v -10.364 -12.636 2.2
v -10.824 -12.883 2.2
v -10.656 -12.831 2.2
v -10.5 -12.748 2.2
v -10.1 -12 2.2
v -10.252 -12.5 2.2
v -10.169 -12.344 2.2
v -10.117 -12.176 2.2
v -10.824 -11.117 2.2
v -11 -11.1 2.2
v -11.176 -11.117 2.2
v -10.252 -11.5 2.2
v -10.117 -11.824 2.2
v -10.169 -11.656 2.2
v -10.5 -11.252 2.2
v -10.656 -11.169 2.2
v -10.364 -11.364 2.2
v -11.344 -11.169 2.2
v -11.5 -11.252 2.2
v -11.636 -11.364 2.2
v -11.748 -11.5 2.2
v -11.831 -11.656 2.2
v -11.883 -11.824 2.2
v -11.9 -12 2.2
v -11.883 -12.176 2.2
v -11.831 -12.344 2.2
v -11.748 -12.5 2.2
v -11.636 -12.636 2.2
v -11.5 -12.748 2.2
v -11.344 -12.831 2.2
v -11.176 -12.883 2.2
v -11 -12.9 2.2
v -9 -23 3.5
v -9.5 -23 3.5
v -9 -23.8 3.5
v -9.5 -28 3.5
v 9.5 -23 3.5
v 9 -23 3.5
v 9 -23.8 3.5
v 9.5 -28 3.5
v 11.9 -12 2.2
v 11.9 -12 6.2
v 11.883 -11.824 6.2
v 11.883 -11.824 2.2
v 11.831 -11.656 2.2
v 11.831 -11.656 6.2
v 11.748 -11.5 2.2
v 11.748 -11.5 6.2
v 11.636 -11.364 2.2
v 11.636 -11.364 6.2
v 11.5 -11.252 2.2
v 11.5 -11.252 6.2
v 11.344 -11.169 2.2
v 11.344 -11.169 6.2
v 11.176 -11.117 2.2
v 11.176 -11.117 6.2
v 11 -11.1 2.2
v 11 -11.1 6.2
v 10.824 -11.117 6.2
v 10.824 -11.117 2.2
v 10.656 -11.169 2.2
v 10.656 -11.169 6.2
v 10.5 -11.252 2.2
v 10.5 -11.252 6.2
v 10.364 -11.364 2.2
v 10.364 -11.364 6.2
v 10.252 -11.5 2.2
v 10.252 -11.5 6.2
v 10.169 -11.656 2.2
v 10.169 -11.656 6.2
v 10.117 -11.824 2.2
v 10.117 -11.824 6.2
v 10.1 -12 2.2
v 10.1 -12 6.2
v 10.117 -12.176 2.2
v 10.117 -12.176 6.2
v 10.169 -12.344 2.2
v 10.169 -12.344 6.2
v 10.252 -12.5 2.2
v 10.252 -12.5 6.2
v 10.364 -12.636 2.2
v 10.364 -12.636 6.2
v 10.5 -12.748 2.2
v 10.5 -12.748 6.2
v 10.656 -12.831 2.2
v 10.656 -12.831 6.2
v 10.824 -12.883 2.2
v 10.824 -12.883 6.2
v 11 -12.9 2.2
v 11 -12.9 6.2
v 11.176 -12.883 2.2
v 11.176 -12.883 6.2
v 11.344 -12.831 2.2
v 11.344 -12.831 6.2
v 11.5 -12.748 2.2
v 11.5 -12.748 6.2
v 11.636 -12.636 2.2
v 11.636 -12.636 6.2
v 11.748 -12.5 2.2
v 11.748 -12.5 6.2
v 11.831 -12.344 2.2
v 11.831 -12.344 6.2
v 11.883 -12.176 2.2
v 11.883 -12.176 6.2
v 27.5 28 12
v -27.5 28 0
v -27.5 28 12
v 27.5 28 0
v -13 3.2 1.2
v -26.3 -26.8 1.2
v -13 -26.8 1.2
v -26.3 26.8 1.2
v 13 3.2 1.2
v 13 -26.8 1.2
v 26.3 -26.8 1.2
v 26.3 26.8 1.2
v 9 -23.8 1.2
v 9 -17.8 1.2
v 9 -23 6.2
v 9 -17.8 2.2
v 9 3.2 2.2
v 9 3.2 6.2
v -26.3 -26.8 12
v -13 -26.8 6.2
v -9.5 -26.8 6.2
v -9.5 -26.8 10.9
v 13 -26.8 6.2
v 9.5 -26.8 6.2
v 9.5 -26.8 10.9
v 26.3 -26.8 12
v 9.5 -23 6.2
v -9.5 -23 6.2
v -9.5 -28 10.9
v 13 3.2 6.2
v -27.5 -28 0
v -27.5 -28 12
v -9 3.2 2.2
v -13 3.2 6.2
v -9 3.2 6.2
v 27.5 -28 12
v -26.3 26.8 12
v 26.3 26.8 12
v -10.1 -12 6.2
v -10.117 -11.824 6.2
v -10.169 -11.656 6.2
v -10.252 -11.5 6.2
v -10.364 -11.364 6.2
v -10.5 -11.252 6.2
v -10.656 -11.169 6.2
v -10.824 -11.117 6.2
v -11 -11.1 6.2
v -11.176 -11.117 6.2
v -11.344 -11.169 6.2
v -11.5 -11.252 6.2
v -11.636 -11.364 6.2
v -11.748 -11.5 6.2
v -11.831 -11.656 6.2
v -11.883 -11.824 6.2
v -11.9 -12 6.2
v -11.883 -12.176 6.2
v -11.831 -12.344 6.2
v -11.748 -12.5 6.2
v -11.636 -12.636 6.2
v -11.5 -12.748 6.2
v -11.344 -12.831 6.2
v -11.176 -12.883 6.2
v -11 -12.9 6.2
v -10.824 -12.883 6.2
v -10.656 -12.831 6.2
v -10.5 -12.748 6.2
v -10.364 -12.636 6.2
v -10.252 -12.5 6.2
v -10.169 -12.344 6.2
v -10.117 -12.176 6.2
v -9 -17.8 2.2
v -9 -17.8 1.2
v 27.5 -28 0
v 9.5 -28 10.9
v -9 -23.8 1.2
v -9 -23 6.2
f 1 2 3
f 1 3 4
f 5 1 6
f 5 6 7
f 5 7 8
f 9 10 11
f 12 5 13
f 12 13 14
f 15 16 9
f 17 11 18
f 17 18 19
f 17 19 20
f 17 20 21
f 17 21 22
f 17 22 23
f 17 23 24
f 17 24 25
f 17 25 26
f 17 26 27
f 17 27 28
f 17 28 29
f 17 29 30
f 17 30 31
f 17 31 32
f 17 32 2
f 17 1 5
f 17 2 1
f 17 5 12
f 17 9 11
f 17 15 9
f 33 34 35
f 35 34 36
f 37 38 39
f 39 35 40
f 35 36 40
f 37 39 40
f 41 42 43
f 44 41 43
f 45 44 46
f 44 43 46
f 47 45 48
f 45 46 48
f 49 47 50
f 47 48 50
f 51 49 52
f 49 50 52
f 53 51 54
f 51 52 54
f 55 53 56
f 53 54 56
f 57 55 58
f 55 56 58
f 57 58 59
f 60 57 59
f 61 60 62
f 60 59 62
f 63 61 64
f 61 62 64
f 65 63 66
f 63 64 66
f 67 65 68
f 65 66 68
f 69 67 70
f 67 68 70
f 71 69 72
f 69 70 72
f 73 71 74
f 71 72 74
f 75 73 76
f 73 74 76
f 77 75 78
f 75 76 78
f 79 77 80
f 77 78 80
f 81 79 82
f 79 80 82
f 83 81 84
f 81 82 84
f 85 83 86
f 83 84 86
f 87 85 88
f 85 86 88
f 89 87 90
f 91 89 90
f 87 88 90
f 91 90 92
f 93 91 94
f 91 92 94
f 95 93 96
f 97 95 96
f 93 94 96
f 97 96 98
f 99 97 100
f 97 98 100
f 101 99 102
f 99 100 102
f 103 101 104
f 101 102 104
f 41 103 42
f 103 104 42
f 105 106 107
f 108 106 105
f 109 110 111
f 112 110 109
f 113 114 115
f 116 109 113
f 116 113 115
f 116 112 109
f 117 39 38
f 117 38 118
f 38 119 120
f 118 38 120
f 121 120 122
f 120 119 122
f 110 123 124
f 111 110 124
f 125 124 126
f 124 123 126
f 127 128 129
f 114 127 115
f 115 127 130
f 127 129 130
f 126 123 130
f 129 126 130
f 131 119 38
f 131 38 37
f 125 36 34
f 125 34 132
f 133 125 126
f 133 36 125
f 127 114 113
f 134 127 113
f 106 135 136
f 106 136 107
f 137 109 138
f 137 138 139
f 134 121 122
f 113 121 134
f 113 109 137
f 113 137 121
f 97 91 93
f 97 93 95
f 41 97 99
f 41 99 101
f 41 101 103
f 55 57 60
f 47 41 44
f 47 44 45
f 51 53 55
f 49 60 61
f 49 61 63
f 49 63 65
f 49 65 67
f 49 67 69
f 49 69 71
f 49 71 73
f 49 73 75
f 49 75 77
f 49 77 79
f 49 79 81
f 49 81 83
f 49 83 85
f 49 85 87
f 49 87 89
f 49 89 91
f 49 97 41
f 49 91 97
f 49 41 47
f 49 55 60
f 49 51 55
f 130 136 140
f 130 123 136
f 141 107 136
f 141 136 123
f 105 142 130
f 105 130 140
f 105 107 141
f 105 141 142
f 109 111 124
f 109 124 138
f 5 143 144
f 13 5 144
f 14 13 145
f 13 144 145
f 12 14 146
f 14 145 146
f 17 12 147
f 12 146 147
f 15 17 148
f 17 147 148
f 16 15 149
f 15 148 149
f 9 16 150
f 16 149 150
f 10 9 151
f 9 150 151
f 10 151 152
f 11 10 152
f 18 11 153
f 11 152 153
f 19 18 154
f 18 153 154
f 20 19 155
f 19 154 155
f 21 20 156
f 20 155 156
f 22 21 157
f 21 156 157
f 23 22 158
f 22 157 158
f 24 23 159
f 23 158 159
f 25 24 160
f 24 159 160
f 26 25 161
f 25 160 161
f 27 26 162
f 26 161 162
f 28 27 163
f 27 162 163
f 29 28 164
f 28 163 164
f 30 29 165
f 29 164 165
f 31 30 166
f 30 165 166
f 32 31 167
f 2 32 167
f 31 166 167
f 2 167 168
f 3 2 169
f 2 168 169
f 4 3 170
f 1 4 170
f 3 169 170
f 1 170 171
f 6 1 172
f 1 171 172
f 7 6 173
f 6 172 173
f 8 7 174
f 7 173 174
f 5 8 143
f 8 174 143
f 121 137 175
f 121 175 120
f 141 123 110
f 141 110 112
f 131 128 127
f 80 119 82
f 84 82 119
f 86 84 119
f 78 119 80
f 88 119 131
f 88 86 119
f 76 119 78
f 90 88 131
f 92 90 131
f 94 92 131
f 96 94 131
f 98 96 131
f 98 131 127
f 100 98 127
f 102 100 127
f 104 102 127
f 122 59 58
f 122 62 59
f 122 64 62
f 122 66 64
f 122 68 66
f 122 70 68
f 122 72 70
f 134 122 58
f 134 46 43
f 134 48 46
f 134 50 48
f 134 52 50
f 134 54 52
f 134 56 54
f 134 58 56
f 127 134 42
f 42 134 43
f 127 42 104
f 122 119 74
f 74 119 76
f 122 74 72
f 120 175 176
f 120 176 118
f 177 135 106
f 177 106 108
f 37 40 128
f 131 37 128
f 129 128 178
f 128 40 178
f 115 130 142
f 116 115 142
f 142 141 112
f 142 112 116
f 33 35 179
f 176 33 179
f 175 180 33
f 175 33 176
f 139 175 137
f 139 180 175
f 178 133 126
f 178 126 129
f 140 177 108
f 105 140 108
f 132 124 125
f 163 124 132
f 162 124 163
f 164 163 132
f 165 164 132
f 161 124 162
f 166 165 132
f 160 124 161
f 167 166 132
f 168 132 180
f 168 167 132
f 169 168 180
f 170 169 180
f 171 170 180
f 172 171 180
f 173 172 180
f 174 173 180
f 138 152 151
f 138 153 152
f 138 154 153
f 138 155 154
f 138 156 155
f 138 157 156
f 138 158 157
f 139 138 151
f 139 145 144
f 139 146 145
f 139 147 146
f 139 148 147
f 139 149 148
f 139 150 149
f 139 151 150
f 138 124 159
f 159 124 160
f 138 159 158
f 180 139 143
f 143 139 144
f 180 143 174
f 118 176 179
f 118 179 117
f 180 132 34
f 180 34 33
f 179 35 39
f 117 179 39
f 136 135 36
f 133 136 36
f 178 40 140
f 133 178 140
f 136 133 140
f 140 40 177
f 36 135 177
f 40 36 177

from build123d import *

# Parameters (mm, degrees)
SKETCH_W        = 55
SKETCH_H        = 56
PAD_DEPTH       = 12
SKETCH012_W     = 52.6
SKETCH012_H     = 53.6
POCKET_DEPTH    = 10.8
SKETCH013_W     = 26
SKETCH013_H     = 30
PAD010_DEPTH    = 5
SKETCH014_W     = 18
SKETCH014_H     = 6
POCKET001_DEPTH = 5
SKETCH015_W     = 18
SKETCH015_H     = 22
POCKET002_DEPTH = 4
SKETCH016_W     = 19
SKETCH016_H     = 7.4
POCKET003_DEPTH = 5
SKETCH017_R     = 0.9
POCKET004_DEPTH = 4


with BuildPart() as part:
    # Sketch → Pad (new body)
    with BuildSketch(Plane.XY):
        Rectangle(SKETCH_W, SKETCH_H)
    extrude(amount=PAD_DEPTH)

    # Sketch012 (on Face6 of Pad) → Pocket (cut)
    with BuildSketch(Plane.XY.offset(12)):
        Rectangle(SKETCH012_W, SKETCH012_H)
    extrude(amount=-POCKET_DEPTH, mode=Mode.SUBTRACT)

    # Sketch013 (on Face11 of Pocket) → Pad010 (join)
    with BuildSketch(Plane.XY.offset(1.2)):
        with Locations((0, -11.8)):
            Rectangle(SKETCH013_W, SKETCH013_H)
    extrude(amount=PAD010_DEPTH)

    # Sketch014 (on Face13 of Pad010) → Pocket001 (cut)
    with BuildSketch(Plane.XY.offset(6.2)):
        with Locations((0, -20.8)):
            Rectangle(SKETCH014_W, SKETCH014_H)
    extrude(amount=-POCKET001_DEPTH, mode=Mode.SUBTRACT)

    # Sketch015 (on Face13 of Pocket001) → Pocket002 (cut)
    with BuildSketch(Plane.XY.offset(6.2)):
        with Locations((0, -6.8)):
            Rectangle(SKETCH015_W, SKETCH015_H)
    extrude(amount=-POCKET002_DEPTH, mode=Mode.SUBTRACT)

    # Sketch016 (on Face6 of Pocket002) → Pocket003 (cut)
    with BuildSketch(Plane.XZ.offset(28)):
        with Locations((0, 7.2)):
            Rectangle(SKETCH016_W, SKETCH016_H)
    extrude(amount=-POCKET003_DEPTH, mode=Mode.SUBTRACT)

    # Sketch017 (on DatumPlane) → Pocket004 (cut)
    with BuildSketch(Plane.XY.offset(6.2)):
        with Locations((-11, -12)):
            Circle(SKETCH017_R)
        with Locations((11, -12)):
            Circle(SKETCH017_R)
    extrude(amount=-POCKET004_DEPTH, mode=Mode.SUBTRACT)


solid = part.part
